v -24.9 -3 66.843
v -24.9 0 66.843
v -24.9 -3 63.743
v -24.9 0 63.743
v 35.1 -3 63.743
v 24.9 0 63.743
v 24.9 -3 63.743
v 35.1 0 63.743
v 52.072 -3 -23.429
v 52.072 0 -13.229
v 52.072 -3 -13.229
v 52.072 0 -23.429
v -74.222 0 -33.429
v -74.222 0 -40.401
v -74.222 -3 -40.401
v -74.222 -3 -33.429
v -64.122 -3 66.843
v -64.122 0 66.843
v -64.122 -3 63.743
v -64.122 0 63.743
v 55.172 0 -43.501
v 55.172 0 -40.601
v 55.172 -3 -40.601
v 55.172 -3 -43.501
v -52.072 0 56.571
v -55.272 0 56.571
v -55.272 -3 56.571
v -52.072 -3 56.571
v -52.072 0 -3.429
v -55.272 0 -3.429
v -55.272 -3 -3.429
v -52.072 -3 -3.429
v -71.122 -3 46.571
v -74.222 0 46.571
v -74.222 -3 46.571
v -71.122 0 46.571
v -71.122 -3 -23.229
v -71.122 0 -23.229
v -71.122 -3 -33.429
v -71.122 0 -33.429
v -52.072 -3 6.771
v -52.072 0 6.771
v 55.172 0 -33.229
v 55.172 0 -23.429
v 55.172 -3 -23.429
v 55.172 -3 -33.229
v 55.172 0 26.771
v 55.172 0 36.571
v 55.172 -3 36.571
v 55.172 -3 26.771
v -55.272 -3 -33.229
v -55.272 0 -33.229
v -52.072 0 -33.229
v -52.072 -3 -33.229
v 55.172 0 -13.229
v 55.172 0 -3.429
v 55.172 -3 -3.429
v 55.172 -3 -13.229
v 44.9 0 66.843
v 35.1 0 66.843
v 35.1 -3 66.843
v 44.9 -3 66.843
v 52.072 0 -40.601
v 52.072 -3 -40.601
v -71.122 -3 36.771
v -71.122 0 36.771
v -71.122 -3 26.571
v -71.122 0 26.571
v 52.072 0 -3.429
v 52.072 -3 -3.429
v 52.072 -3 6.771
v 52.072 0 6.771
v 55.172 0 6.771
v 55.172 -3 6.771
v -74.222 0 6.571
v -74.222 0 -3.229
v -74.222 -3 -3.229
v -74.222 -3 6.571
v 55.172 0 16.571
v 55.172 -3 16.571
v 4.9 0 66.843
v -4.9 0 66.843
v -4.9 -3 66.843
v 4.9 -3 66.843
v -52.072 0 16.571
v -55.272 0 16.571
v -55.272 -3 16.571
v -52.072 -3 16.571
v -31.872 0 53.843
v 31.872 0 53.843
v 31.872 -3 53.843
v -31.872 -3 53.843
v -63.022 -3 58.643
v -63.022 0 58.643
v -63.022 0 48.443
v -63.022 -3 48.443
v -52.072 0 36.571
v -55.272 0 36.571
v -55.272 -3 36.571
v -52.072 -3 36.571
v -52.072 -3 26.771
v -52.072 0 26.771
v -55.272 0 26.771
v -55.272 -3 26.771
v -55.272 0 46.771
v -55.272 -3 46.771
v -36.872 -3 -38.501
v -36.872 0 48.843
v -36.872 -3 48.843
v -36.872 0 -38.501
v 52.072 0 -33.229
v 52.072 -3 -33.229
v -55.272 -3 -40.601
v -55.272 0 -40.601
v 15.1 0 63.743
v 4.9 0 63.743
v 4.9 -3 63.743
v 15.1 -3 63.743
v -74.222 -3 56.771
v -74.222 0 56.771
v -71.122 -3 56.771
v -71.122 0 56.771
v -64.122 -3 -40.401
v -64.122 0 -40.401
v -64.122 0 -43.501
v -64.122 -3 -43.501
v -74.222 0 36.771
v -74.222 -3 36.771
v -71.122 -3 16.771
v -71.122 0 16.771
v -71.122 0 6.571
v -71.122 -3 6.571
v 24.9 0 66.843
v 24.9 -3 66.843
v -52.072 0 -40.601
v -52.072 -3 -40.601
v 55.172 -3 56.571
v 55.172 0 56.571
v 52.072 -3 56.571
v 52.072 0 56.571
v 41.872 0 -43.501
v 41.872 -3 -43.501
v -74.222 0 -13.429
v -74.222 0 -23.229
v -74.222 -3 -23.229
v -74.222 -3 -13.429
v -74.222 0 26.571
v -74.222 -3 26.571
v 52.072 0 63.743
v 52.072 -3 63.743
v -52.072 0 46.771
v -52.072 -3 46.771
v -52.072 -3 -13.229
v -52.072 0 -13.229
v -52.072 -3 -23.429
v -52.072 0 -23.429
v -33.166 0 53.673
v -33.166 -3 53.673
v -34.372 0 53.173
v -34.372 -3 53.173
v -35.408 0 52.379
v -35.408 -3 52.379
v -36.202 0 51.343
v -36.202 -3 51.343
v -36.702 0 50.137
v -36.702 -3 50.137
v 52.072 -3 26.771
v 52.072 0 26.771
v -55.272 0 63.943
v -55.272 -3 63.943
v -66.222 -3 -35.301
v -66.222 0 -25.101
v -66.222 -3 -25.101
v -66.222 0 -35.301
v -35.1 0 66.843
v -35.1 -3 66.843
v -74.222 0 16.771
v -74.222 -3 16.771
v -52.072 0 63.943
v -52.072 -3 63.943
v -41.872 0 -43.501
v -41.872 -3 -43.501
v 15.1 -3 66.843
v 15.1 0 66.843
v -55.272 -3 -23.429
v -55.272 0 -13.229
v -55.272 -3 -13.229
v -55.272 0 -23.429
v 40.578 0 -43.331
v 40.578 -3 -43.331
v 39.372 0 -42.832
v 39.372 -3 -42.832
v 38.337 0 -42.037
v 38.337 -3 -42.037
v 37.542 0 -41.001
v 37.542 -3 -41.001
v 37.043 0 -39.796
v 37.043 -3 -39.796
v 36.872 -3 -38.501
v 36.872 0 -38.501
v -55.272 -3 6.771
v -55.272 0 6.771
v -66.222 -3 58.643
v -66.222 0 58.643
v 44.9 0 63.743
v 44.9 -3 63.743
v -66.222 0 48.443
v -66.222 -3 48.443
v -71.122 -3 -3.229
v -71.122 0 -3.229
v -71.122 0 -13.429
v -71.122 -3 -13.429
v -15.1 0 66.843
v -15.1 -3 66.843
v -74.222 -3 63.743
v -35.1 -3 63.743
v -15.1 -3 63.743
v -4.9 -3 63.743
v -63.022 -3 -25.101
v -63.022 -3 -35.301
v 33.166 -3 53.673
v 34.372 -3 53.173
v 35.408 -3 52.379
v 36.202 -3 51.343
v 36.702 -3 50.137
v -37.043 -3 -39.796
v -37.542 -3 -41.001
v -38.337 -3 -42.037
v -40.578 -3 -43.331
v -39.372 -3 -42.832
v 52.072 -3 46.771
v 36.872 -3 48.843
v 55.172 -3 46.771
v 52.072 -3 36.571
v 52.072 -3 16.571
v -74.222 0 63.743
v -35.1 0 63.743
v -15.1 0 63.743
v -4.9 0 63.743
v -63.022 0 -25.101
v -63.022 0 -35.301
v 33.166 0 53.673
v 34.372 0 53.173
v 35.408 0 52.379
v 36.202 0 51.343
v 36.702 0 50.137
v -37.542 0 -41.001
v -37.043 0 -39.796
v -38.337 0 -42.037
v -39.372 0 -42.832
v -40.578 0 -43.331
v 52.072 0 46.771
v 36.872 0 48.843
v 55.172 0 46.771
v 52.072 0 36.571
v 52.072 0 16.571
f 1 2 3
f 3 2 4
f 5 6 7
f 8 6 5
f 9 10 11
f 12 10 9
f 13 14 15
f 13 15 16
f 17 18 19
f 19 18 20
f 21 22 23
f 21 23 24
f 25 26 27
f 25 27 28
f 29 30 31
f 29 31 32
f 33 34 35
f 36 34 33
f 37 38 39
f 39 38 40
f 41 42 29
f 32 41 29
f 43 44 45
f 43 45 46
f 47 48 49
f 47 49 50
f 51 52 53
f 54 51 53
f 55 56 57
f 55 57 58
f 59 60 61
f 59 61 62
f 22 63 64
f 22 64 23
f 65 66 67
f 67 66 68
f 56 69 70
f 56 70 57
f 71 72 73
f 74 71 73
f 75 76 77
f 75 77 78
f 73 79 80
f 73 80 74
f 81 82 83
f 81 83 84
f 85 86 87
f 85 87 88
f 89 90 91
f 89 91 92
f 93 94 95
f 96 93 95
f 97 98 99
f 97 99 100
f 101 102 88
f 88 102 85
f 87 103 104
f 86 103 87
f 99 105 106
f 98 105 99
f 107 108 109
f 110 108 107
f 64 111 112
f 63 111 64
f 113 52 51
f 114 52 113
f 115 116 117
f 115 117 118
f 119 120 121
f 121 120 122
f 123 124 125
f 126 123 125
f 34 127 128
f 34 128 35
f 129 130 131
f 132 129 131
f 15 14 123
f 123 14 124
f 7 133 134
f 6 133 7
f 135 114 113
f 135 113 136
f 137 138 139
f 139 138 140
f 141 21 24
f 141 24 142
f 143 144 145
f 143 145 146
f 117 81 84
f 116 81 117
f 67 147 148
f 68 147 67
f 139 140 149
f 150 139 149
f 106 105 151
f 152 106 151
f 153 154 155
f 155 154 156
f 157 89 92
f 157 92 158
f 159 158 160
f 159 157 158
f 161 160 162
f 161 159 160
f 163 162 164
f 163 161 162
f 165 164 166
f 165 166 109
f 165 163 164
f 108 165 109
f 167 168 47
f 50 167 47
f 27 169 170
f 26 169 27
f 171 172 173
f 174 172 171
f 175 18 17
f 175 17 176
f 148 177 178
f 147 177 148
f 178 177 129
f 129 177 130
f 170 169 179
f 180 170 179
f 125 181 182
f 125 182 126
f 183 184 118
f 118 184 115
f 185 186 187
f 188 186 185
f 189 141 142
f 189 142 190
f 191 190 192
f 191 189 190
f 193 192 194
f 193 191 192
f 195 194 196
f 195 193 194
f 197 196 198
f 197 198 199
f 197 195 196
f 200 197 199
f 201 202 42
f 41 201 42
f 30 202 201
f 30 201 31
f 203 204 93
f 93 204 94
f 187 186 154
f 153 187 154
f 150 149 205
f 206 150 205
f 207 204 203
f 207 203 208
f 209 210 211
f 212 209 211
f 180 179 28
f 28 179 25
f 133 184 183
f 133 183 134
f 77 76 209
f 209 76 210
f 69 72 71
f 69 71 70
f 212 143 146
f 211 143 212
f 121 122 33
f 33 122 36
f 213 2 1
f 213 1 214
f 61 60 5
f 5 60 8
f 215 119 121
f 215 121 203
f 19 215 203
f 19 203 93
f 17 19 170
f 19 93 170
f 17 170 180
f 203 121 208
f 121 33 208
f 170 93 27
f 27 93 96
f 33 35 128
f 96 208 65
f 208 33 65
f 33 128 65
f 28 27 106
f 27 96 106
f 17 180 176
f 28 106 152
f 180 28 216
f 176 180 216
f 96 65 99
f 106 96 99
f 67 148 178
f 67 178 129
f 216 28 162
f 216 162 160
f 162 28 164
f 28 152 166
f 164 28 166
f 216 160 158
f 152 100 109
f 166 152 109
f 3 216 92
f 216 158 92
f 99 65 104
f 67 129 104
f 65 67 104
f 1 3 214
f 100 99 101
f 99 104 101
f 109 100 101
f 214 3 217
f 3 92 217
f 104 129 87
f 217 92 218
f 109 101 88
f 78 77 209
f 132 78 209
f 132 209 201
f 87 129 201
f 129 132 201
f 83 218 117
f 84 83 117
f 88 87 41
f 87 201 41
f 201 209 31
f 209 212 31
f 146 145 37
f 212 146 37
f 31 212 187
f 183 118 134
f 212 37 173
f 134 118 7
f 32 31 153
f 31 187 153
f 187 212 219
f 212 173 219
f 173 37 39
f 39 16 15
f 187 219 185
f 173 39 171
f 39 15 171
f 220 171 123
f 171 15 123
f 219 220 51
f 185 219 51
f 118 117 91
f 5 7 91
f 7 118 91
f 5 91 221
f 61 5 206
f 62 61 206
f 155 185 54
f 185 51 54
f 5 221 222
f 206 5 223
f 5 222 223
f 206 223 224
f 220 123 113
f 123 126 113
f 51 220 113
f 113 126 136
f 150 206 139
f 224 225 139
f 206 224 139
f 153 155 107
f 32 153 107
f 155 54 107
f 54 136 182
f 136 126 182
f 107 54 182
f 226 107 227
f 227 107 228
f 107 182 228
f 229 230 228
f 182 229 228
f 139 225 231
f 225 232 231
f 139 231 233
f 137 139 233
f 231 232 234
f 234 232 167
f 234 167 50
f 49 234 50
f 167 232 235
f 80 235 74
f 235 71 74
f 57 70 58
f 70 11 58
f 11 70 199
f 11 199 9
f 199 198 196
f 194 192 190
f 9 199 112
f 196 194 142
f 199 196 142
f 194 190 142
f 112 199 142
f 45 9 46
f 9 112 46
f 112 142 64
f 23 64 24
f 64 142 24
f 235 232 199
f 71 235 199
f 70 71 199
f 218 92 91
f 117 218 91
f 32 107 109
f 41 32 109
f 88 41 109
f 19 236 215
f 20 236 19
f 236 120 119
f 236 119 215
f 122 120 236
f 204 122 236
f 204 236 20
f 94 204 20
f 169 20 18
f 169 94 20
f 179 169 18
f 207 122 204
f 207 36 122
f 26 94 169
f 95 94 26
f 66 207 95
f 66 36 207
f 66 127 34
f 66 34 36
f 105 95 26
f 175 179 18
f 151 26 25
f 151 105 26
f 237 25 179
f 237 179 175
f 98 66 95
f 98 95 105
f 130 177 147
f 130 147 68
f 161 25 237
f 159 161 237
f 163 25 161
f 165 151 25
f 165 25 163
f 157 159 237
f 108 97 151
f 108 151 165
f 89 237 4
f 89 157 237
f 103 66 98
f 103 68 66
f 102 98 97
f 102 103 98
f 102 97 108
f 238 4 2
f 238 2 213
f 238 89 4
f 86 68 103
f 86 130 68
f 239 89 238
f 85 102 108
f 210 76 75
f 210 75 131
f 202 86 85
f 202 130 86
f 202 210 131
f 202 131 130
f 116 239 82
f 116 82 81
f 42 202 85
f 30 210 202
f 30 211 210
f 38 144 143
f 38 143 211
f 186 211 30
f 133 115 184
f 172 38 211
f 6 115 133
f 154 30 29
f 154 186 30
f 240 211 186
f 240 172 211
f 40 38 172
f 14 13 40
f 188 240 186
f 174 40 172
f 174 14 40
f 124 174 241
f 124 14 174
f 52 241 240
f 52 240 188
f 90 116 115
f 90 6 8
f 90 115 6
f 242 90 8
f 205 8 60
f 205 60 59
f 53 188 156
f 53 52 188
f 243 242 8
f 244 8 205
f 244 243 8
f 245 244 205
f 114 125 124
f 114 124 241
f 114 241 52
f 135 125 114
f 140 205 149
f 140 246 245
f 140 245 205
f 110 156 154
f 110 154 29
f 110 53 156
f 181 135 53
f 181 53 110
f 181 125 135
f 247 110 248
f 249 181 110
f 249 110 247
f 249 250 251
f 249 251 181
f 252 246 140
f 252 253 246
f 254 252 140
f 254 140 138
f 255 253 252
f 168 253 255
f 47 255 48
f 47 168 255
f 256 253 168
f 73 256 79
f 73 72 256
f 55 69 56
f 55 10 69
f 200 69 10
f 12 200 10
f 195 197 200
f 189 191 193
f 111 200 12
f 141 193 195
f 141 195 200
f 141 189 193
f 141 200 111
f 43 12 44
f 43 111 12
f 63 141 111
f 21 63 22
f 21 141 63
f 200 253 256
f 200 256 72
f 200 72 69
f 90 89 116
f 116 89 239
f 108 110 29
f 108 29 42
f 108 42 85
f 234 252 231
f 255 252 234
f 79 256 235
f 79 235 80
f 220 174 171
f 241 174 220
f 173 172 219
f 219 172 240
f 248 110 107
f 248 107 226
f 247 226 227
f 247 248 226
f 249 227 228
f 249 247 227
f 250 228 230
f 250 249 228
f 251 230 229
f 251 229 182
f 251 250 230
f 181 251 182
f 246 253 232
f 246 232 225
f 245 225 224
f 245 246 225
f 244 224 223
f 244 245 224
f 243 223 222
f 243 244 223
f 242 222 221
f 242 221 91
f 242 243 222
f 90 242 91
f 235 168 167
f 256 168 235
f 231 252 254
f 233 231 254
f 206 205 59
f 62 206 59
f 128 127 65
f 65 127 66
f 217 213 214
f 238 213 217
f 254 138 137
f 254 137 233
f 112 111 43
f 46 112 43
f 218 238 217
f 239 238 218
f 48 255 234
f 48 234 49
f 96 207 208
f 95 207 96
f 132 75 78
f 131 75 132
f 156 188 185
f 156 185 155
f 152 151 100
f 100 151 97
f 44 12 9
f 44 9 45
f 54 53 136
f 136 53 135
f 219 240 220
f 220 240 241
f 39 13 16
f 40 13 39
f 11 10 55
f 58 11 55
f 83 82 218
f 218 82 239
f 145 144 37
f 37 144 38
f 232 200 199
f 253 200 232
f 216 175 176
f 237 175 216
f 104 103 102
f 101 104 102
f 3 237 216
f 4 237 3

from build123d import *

# Parameters (mm, degrees)
BOSS_EXTRUDE1_DEPTH = 3
SKETCH3_W           = 10.2
SKETCH3_H           = 3.2
SKETCH3_W_2         = 3.2
SKETCH3_H_2         = 10.2
SKETCH3_H_3         = 7.372217102
CUT_EXTRUDE1_DEPTH  = 4


with BuildPart() as part:
    # Sketch2 → Boss-Extrude1 (new body)
    with BuildSketch(Plane(origin=(0, 0, 0), x_dir=(1, 0, 0), z_dir=(0, 1, 0))):
        with BuildLine():
            Line((-74.222217102, -66.842990858), (55.172217102, -66.842990858))
            Line((55.172217102, -66.842990858), (55.172217102, 43.501443346))
            Line((55.172217102, 43.501443346), (41.872217102, 43.501443346))
            ThreePointArc((41.872217102, 43.501443346), (38.336683196, 42.036977252), (36.872217102, 38.501443346))
            Line((36.872217102, 38.501443346), (36.872217102, -48.842990858))
            ThreePointArc((36.872217102, -48.842990858), (35.407751008, -52.378524764), (31.872217102, -53.842990858))
            Line((31.872217102, -53.842990858), (-31.872217102, -53.842990858))
            ThreePointArc((-31.872217102, -53.842990858), (-35.407751008, -52.378524764), (-36.872217102, -48.842990858))
            Line((-36.872217102, -48.842990858), (-36.872217102, 38.501443346))
            ThreePointArc((-36.872217102, 38.501443346), (-38.336683196, 42.036977252), (-41.872217102, 43.501443346))
            Line((-41.872217102, 43.501443346), (-74.222217102, 43.501443346))
            Line((-74.222217102, 43.501443346), (-74.222217102, -66.842990858))
        make_face()
    extrude(amount=-BOSS_EXTRUDE1_DEPTH)

    # Sketch3 → Cut-Extrude1 (cut, through all)
    with BuildSketch(Plane(origin=(0, 0, 0), x_dir=(1, 0, 0), z_dir=(0, 1, 0))):
        with Locations((-69.222217102, -65.342990858)):
            Rectangle(SKETCH3_W, SKETCH3_H)
        with Locations((-53.672217102, 18.329226244)):
            Rectangle(SKETCH3_W_2, SKETCH3_H_2)
        with Locations((-53.672217102, -1.670773756)):
            Rectangle(SKETCH3_W_2, SKETCH3_H_2)
        with Locations((-30, -65.342990858)):
            Rectangle(SKETCH3_W, SKETCH3_H)
        with Locations((-10, -65.342990858)):
            Rectangle(SKETCH3_W, SKETCH3_H)
        with Locations((-53.672217102, 36.915334795)):
            Rectangle(SKETCH3_W_2, SKETCH3_H_3)
        with Locations((30, -65.342990858)):
            Rectangle(SKETCH3_W, SKETCH3_H)
        with Locations((-53.672217102, -41.670773756)):
            Rectangle(SKETCH3_W_2, SKETCH3_H_2)
        with Locations((-53.672217102, -21.670773756)):
            Rectangle(SKETCH3_W_2, SKETCH3_H_2)
        with Locations((-53.672217102, -60.256882307)):
            Rectangle(SKETCH3_W_2, SKETCH3_H_3)
        Polygon((52.072217102, -56.570773756), (52.072217102, -63.742990858), (44.9, -63.742990858), (44.9, -66.942990858), (55.272217102, -66.942990858), (55.272217102, -56.570773756), align=None)
        with Locations((53.672217102, -21.670773756)):
            Rectangle(SKETCH3_W_2, SKETCH3_H_2)
        with Locations((53.672217102, -41.670773756)):
            Rectangle(SKETCH3_W_2, SKETCH3_H_2)
        with Locations((10, -65.342990858)):
            Rectangle(SKETCH3_W, SKETCH3_H)
        with Locations((53.672217102, 18.329226244)):
            Rectangle(SKETCH3_W_2, SKETCH3_H_2)
        with Locations((53.672217102, -1.670773756)):
            Rectangle(SKETCH3_W_2, SKETCH3_H_2)
        with Locations((53.672217102, 36.915334795)):
            Rectangle(SKETCH3_W_2, SKETCH3_H_3)
        with Locations((-72.722217102, 28.329226244)):
            Rectangle(SKETCH3_W_2, SKETCH3_H_2)
        with Locations((-72.722217102, 8.329226244)):
            Rectangle(SKETCH3_W_2, SKETCH3_H_2)
        with Locations((-72.722217102, -11.670773756)):
            Rectangle(SKETCH3_W_2, SKETCH3_H_2)
        with Locations((-69.222217102, 42.001443346)):
            Rectangle(SKETCH3_W, SKETCH3_H)
        with Locations((-64.622217102, -53.542990858)):
            Rectangle(SKETCH3_W_2, SKETCH3_H_2)
        with Locations((-64.622217102, 30.201443346)):
            Rectangle(SKETCH3_W_2, SKETCH3_H_2)
        with Locations((-72.722217102, -51.670773756)):
            Rectangle(SKETCH3_W_2, SKETCH3_H_2)
        with Locations((-72.722217102, -31.670773756)):
            Rectangle(SKETCH3_W_2, SKETCH3_H_2)
    extrude(amount=-CUT_EXTRUDE1_DEPTH, mode=Mode.SUBTRACT)


solid = part.part
